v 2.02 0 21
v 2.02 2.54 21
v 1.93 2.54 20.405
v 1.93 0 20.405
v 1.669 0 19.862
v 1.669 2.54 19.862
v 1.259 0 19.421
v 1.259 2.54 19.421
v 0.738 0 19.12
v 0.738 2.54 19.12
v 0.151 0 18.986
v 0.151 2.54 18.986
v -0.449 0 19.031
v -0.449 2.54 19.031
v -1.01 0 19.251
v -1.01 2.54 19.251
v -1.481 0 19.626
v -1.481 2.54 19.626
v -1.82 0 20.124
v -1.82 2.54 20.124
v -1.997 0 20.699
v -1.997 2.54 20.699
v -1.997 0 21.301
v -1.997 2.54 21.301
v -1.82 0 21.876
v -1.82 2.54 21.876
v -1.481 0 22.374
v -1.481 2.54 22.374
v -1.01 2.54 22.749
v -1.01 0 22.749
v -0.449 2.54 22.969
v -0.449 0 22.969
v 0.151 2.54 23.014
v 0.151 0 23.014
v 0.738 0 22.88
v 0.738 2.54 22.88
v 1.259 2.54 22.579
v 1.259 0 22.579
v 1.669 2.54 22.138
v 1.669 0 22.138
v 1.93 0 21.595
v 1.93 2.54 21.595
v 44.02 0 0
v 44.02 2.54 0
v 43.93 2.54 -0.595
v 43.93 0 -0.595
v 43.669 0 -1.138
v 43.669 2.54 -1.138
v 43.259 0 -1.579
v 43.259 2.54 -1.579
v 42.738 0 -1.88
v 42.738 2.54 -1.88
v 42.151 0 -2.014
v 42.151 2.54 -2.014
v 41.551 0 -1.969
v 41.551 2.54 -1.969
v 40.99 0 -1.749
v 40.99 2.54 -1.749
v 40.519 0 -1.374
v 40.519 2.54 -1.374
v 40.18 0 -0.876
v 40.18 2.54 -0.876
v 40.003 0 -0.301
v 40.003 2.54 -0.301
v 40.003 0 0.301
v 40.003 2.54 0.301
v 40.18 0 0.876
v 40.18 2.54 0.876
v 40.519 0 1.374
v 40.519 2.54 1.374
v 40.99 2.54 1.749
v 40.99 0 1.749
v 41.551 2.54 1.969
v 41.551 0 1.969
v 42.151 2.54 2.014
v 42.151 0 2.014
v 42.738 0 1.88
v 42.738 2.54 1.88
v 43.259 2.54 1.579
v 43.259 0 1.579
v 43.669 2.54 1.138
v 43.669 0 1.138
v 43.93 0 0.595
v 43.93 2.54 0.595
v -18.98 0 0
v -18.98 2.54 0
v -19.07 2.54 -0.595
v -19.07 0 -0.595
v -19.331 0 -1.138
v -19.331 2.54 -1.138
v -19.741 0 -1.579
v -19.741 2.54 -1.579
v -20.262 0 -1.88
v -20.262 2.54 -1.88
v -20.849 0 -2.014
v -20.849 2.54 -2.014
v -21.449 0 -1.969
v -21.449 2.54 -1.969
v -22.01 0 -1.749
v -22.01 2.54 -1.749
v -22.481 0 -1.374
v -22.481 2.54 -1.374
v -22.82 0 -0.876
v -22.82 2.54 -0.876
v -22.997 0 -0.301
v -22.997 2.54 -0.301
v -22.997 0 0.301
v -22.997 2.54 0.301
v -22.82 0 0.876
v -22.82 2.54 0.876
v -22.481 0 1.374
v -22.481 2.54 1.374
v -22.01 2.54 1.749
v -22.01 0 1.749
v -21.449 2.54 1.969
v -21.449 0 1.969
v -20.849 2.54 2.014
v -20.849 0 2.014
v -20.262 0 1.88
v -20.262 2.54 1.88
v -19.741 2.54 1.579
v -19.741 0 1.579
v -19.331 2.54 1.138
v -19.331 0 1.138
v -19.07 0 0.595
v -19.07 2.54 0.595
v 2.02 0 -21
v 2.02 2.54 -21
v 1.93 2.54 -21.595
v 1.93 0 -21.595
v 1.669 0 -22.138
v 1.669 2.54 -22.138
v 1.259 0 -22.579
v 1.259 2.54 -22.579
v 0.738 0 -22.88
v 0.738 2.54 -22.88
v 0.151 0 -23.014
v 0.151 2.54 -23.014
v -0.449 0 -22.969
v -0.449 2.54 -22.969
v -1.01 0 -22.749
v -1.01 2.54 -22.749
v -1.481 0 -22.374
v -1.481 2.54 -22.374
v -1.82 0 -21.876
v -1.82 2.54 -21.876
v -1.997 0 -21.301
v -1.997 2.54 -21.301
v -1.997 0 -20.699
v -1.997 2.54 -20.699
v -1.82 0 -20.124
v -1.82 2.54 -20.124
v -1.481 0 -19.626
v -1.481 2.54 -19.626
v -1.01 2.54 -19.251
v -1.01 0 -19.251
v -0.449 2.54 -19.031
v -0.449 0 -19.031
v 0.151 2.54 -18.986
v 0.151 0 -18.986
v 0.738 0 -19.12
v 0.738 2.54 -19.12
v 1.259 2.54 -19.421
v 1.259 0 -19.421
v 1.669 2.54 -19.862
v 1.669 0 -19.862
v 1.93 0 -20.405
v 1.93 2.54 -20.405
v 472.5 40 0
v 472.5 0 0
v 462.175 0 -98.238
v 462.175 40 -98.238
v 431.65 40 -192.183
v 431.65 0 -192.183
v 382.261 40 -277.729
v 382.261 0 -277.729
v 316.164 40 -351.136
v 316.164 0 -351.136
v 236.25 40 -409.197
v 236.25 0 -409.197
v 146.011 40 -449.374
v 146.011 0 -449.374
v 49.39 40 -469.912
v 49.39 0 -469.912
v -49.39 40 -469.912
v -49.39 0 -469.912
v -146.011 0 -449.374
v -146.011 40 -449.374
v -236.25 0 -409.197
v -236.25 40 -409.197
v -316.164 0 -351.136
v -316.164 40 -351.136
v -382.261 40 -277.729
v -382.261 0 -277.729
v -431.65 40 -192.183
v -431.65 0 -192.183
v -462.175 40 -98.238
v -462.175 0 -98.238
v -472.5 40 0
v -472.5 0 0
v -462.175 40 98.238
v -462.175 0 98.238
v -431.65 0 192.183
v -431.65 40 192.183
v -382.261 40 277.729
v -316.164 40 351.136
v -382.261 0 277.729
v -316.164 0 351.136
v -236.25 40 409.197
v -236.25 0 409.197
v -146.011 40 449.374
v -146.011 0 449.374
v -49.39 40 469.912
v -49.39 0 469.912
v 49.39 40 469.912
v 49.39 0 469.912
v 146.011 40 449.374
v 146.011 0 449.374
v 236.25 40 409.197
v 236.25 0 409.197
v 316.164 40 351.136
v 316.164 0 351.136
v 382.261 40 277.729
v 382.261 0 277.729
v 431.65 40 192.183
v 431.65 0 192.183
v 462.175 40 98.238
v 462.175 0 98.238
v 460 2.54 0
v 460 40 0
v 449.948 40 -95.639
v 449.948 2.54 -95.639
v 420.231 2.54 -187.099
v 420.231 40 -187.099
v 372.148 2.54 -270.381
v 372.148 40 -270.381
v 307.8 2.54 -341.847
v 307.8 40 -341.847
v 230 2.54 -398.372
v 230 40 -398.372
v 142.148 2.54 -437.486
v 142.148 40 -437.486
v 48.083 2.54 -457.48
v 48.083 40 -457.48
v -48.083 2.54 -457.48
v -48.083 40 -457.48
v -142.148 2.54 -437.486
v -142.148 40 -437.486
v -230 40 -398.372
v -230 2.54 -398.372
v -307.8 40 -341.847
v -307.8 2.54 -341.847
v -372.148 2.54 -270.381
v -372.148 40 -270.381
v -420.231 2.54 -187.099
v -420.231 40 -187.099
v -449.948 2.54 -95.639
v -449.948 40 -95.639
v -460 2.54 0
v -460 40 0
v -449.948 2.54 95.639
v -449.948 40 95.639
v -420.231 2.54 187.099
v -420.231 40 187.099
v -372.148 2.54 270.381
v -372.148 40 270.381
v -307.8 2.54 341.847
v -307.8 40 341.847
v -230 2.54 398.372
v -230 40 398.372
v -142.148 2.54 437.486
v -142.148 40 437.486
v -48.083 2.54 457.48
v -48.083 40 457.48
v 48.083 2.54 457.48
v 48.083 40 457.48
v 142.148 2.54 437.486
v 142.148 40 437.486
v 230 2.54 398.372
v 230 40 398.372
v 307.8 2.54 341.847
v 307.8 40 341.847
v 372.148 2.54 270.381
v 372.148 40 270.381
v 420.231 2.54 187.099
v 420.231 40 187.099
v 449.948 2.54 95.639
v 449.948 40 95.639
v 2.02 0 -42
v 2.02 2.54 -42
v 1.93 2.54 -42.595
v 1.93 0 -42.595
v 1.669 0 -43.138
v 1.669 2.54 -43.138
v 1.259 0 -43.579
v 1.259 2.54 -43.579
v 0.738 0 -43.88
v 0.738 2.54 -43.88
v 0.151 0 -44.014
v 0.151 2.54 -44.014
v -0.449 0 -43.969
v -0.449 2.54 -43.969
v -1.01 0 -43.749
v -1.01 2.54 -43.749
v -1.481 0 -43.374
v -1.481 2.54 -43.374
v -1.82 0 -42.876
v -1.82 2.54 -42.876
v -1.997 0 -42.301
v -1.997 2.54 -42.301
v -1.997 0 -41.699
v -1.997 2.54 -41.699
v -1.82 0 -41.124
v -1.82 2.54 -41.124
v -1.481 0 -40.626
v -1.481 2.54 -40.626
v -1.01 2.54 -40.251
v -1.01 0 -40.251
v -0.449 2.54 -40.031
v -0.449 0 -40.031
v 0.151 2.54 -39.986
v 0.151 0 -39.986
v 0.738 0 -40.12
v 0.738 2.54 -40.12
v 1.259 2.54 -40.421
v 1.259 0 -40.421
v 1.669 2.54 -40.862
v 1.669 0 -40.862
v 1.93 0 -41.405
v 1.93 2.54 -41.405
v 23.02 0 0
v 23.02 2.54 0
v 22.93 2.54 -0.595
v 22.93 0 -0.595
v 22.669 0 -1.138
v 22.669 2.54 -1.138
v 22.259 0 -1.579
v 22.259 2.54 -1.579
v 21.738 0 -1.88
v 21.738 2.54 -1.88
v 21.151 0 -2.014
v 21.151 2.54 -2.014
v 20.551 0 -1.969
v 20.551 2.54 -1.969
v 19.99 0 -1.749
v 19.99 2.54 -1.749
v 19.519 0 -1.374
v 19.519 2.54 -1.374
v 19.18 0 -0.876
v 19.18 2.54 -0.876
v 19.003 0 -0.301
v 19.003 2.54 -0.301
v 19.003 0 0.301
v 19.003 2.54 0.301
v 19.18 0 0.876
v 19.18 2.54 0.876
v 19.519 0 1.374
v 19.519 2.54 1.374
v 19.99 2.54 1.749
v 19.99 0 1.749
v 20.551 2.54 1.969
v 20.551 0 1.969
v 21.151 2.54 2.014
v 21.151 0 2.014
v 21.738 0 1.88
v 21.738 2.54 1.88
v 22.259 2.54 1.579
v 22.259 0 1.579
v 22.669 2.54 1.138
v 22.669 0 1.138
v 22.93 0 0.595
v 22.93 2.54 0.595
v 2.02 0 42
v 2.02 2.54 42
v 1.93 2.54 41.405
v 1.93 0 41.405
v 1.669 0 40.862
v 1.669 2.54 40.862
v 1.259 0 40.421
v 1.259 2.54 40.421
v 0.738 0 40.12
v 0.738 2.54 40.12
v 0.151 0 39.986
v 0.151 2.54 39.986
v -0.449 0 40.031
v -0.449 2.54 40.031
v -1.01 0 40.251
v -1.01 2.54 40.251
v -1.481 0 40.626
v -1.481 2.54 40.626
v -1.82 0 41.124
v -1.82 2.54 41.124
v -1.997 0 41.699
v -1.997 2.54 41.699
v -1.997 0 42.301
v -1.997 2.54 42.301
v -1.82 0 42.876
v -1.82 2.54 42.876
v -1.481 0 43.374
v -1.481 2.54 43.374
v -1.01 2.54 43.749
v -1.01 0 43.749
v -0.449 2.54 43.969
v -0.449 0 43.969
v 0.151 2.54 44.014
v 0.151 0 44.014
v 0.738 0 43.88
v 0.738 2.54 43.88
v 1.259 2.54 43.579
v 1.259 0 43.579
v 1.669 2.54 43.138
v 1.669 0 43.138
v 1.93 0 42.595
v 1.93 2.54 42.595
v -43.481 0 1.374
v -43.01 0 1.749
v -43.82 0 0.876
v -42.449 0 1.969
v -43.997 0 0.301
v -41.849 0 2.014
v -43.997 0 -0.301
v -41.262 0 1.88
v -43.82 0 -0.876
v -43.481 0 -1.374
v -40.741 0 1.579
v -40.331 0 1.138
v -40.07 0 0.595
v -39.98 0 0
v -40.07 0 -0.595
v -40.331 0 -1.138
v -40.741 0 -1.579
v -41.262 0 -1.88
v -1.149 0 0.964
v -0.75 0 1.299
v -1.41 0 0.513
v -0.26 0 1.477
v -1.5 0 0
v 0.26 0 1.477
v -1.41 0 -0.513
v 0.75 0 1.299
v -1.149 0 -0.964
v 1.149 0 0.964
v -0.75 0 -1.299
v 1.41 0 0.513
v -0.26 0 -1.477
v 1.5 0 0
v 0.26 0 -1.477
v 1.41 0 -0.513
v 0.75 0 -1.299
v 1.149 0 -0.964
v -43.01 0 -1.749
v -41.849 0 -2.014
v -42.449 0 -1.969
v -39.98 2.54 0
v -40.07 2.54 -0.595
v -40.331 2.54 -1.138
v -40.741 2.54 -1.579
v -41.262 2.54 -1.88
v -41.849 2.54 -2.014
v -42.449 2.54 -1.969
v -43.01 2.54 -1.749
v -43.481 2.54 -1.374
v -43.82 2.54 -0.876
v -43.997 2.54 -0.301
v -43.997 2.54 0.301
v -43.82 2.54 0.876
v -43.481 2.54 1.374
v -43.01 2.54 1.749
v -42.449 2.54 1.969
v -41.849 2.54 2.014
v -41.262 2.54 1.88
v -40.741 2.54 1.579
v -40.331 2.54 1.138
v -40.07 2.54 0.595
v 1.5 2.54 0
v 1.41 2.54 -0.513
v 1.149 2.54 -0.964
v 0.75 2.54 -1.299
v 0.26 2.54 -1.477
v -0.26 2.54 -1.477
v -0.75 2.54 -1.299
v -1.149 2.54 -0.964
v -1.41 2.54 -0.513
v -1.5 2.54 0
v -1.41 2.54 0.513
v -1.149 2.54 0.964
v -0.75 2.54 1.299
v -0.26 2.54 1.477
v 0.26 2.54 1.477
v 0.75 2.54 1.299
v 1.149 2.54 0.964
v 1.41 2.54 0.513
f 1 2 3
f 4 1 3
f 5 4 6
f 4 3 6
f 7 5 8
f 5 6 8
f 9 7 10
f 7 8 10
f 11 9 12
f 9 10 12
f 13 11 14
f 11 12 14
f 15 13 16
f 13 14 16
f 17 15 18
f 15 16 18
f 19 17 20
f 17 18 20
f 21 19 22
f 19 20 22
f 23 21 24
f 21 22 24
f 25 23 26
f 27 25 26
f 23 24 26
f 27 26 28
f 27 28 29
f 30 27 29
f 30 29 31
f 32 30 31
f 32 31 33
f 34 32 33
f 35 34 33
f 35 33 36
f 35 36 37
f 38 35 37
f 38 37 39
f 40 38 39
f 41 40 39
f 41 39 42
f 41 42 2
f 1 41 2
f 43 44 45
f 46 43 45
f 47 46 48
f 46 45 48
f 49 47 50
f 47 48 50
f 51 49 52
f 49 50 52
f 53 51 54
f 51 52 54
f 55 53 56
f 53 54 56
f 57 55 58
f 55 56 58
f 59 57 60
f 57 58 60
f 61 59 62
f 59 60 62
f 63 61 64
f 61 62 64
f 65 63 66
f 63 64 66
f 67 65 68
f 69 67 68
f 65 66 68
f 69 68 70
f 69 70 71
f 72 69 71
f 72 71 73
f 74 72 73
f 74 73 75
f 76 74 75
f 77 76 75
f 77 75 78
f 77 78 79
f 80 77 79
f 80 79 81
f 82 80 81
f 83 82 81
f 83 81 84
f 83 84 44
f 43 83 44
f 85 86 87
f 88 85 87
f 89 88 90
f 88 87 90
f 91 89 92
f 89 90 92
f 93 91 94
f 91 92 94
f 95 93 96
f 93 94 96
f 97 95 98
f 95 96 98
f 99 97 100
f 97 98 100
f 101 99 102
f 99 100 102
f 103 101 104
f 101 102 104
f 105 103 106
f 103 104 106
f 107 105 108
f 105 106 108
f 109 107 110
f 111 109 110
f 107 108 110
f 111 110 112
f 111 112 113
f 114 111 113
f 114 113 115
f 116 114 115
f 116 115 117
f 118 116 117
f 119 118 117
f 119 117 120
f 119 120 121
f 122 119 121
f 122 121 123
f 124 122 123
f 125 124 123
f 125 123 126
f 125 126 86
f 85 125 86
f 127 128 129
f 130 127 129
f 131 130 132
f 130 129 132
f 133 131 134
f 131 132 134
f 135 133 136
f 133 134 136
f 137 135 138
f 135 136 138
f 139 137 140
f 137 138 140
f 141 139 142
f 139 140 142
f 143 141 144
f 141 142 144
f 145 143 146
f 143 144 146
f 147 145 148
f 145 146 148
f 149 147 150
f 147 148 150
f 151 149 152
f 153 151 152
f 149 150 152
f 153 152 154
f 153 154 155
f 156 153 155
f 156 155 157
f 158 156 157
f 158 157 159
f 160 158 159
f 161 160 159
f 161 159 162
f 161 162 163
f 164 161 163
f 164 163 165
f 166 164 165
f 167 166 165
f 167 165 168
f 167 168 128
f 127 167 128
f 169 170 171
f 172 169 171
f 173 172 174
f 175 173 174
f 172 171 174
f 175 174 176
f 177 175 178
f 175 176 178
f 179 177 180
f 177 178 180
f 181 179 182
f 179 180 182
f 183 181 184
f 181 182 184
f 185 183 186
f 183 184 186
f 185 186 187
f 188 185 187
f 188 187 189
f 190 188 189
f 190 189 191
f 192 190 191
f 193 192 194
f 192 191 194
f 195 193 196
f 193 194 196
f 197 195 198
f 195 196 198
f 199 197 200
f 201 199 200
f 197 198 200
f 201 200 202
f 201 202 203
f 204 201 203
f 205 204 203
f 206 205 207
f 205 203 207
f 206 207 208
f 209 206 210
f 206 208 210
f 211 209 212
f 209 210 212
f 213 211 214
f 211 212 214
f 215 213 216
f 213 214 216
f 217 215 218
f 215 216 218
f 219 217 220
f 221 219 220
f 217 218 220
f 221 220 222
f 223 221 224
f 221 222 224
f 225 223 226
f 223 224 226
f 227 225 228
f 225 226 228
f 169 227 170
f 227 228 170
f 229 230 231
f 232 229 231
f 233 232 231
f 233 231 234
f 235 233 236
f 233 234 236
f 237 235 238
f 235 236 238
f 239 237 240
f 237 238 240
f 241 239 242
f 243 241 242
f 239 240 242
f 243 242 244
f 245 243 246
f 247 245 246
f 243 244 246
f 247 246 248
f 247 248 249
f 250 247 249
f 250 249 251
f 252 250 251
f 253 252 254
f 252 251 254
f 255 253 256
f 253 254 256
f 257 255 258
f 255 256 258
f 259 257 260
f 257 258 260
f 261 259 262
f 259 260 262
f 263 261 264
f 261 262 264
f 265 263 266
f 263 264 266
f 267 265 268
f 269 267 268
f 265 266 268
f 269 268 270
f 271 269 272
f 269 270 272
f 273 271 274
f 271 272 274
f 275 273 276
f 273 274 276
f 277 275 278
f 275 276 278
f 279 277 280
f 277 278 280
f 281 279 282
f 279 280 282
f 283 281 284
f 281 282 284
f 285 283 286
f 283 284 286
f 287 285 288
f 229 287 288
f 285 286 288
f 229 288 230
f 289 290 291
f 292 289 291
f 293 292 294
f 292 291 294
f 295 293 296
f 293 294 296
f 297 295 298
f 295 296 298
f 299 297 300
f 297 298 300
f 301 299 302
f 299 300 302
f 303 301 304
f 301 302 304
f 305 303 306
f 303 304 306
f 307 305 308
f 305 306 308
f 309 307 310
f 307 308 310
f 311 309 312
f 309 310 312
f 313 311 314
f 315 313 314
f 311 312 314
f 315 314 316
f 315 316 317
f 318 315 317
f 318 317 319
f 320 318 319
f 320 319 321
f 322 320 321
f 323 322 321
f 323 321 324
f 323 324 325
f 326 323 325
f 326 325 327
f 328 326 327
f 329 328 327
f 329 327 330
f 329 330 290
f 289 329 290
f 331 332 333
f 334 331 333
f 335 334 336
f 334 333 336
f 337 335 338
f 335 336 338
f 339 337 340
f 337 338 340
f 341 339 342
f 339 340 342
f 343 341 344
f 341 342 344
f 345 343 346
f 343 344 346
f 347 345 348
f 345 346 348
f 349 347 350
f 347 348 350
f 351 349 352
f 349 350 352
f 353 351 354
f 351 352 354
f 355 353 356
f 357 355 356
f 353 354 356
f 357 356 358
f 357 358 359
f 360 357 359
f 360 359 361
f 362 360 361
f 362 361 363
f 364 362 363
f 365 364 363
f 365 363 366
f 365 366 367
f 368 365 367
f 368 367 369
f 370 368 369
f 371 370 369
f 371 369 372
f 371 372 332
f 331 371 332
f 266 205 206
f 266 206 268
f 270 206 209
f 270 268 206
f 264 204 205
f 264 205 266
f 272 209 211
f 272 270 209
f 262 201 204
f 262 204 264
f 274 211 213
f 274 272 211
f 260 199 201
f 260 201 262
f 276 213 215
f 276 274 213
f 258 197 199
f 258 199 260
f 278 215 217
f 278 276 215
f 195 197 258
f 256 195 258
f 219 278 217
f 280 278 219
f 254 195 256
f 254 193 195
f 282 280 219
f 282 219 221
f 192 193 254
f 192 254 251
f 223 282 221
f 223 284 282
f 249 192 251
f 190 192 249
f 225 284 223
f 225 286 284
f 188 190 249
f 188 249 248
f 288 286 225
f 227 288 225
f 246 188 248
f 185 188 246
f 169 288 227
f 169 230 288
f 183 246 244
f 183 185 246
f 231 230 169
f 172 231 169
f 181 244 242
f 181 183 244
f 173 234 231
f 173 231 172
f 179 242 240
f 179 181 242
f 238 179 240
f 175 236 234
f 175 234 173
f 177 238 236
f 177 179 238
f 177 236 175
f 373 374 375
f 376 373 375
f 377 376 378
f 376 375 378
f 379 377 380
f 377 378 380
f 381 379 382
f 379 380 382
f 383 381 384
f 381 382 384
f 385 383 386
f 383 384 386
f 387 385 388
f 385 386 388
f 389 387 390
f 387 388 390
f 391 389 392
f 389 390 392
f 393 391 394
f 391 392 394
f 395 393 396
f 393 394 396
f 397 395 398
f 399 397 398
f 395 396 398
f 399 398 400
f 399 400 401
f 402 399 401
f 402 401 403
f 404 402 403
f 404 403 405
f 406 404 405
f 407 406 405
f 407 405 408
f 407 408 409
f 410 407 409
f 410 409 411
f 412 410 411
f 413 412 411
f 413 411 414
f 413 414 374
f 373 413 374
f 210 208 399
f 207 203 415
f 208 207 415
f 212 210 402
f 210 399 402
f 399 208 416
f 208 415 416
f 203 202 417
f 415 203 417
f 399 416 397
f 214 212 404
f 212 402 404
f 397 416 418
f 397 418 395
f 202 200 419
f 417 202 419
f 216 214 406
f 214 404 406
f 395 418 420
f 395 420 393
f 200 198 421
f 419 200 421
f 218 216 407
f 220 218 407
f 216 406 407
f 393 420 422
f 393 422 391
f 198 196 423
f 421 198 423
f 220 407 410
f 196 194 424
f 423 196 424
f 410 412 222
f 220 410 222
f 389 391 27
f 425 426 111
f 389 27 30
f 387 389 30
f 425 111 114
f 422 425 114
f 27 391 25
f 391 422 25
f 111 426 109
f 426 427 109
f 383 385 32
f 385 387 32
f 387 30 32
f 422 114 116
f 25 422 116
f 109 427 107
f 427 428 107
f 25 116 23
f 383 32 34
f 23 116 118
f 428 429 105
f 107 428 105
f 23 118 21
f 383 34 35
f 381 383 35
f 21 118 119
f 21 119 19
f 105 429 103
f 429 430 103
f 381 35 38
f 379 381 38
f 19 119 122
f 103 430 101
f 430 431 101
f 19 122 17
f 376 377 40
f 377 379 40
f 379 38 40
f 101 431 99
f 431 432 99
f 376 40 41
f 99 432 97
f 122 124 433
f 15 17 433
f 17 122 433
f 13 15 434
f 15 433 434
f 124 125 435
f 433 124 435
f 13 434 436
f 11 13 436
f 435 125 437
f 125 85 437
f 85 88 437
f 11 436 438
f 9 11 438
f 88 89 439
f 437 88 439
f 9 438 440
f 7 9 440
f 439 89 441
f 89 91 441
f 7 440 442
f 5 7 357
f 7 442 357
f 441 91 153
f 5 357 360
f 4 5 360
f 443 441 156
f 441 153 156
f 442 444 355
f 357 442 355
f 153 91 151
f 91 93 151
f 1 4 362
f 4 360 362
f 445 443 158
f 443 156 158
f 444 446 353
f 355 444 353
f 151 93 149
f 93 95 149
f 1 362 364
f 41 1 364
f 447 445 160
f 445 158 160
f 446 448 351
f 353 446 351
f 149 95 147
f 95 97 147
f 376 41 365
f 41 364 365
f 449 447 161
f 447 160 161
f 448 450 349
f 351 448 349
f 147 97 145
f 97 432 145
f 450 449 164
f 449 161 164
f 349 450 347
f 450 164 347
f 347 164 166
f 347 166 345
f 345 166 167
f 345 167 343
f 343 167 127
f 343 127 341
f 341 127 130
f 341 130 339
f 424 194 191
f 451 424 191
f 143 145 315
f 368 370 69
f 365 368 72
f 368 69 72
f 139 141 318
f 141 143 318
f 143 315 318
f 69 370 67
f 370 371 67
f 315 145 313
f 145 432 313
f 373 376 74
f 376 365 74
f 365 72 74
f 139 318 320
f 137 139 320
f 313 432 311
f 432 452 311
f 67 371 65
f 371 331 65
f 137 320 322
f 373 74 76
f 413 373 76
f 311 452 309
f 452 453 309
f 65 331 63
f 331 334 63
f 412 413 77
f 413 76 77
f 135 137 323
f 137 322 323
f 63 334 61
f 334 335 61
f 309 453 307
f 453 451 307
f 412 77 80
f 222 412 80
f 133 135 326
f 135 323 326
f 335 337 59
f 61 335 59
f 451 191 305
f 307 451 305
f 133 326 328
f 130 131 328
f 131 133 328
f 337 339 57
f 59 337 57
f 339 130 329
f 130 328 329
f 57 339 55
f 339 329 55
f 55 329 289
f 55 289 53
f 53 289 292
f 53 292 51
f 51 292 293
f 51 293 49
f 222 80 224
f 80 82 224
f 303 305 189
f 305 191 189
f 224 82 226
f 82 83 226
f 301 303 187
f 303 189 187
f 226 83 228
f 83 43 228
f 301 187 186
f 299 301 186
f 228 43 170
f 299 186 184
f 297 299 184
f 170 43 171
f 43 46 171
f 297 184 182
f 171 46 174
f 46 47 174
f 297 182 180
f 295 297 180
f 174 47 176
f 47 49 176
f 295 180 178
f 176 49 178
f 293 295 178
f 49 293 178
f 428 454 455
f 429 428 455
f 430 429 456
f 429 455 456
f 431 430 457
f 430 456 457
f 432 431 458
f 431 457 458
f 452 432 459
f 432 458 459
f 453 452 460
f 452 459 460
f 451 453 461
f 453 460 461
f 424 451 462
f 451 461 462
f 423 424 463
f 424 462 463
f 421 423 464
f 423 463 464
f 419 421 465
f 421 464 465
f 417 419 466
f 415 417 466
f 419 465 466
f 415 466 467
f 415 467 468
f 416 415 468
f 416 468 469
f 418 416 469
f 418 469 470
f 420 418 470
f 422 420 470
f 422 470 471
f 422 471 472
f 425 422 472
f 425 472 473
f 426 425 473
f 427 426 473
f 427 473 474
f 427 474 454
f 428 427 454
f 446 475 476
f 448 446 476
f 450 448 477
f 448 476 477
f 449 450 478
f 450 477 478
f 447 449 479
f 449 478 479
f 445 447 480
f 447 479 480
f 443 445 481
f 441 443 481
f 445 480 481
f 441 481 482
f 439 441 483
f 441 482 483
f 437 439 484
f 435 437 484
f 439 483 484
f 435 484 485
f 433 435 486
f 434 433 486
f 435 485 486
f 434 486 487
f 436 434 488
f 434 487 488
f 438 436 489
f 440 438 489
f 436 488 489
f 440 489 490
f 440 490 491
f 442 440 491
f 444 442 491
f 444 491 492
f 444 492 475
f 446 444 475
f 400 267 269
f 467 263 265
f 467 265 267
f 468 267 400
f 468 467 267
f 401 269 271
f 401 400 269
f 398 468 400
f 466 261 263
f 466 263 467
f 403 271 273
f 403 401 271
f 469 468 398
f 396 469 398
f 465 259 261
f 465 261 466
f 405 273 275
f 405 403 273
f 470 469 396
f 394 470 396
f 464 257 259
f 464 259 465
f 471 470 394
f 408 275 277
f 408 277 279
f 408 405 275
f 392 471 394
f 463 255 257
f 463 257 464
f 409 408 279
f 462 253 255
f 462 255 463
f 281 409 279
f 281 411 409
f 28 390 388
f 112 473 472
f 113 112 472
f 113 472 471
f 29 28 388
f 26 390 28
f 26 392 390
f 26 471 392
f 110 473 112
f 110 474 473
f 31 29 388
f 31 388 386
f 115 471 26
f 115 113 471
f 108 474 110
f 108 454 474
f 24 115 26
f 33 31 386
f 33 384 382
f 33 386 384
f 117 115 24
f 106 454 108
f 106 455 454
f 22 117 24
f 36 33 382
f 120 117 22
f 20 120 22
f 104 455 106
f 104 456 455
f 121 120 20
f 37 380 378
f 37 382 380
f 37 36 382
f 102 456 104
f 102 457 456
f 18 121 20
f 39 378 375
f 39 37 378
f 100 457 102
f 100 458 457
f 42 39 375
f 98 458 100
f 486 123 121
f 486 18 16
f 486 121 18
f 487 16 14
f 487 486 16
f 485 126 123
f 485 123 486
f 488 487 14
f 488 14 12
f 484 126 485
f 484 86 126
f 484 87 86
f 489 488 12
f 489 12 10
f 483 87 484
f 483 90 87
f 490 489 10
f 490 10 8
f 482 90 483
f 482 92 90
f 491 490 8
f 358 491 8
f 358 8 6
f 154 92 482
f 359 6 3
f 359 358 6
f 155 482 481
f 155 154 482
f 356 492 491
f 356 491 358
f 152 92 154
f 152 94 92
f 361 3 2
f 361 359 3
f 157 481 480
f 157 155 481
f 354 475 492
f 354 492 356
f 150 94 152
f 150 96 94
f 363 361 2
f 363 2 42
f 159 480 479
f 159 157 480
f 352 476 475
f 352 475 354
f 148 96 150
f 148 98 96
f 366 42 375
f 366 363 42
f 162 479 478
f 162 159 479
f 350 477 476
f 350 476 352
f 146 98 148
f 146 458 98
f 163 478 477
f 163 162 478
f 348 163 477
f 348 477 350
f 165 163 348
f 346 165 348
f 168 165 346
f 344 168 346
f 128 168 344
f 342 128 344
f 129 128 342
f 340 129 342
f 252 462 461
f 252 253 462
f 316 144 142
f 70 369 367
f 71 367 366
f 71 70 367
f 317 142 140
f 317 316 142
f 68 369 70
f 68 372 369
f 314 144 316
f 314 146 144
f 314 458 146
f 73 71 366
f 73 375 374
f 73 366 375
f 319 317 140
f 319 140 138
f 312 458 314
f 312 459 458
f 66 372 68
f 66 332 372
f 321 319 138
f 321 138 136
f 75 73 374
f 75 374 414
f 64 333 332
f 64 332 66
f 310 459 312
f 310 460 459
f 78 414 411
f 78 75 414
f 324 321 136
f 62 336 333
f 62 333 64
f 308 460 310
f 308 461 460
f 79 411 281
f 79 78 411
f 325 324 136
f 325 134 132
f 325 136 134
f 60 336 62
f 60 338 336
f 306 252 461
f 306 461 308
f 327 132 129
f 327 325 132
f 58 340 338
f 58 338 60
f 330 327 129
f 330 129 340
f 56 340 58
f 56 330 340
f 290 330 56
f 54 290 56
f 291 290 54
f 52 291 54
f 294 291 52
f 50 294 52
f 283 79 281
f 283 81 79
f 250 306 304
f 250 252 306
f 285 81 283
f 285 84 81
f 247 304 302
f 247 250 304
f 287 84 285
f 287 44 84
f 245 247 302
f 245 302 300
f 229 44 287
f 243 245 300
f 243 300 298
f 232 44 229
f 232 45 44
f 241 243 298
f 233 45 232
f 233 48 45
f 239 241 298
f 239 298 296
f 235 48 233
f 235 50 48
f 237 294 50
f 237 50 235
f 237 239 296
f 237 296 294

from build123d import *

# Parameters (mm, degrees)
SKETCH1_R           = 472.5
BOSS_EXTRUDE1_DEPTH = 40
SKETCH3_R           = 460
CUT_EXTRUDE1_DEPTH  = 37.46
SKETCH5_R           = 1.5
CUT_EXTRUDE3_DEPTH  = 3.54
SKETCH8_R           = 2.02
CUT_EXTRUDE4_DEPTH  = 3.54


with BuildPart() as part:
    # Sketch1 → Boss-Extrude1 (new body)
    with BuildSketch(Plane(origin=(0, 0, 0), x_dir=(1, 0, 0), z_dir=(0, 1, 0))):
        Circle(SKETCH1_R)
    extrude(amount=BOSS_EXTRUDE1_DEPTH)

    # Sketch3 → Cut-Extrude1 (cut)
    with BuildSketch(Plane(origin=(0, 40, 0), x_dir=(1, 0, 0), z_dir=(0, 1, 0))):
        Circle(SKETCH3_R)
    extrude(amount=-CUT_EXTRUDE1_DEPTH, mode=Mode.SUBTRACT)

    # Sketch5 → Cut-Extrude3 (cut, through all)
    with BuildSketch(Plane(origin=(0, 2.54, 0), x_dir=(1, 0, 0), z_dir=(0, 1, 0))):
        Circle(SKETCH5_R)
    extrude(amount=-CUT_EXTRUDE3_DEPTH, mode=Mode.SUBTRACT)

    # Sketch8 → Cut-Extrude4 (cut, through all)
    with BuildSketch(Plane(origin=(0, 2.54, 0), x_dir=(1, 0, 0), z_dir=(0, 1, 0))):
        with Locations((0, 42)):
            Circle(SKETCH8_R)
        with Locations((42, 0)):
            Circle(SKETCH8_R)
        with Locations((0, -42)):
            Circle(SKETCH8_R)
        with Locations((-42, 0)):
            Circle(SKETCH8_R)
        with Locations((0, 21)):
            Circle(SKETCH8_R)
        with Locations((21, 0)):
            Circle(SKETCH8_R)
        with Locations((0, -21)):
            Circle(SKETCH8_R)
        with Locations((-21, 0)):
            Circle(SKETCH8_R)
    extrude(amount=-CUT_EXTRUDE4_DEPTH, mode=Mode.SUBTRACT)


solid = part.part
